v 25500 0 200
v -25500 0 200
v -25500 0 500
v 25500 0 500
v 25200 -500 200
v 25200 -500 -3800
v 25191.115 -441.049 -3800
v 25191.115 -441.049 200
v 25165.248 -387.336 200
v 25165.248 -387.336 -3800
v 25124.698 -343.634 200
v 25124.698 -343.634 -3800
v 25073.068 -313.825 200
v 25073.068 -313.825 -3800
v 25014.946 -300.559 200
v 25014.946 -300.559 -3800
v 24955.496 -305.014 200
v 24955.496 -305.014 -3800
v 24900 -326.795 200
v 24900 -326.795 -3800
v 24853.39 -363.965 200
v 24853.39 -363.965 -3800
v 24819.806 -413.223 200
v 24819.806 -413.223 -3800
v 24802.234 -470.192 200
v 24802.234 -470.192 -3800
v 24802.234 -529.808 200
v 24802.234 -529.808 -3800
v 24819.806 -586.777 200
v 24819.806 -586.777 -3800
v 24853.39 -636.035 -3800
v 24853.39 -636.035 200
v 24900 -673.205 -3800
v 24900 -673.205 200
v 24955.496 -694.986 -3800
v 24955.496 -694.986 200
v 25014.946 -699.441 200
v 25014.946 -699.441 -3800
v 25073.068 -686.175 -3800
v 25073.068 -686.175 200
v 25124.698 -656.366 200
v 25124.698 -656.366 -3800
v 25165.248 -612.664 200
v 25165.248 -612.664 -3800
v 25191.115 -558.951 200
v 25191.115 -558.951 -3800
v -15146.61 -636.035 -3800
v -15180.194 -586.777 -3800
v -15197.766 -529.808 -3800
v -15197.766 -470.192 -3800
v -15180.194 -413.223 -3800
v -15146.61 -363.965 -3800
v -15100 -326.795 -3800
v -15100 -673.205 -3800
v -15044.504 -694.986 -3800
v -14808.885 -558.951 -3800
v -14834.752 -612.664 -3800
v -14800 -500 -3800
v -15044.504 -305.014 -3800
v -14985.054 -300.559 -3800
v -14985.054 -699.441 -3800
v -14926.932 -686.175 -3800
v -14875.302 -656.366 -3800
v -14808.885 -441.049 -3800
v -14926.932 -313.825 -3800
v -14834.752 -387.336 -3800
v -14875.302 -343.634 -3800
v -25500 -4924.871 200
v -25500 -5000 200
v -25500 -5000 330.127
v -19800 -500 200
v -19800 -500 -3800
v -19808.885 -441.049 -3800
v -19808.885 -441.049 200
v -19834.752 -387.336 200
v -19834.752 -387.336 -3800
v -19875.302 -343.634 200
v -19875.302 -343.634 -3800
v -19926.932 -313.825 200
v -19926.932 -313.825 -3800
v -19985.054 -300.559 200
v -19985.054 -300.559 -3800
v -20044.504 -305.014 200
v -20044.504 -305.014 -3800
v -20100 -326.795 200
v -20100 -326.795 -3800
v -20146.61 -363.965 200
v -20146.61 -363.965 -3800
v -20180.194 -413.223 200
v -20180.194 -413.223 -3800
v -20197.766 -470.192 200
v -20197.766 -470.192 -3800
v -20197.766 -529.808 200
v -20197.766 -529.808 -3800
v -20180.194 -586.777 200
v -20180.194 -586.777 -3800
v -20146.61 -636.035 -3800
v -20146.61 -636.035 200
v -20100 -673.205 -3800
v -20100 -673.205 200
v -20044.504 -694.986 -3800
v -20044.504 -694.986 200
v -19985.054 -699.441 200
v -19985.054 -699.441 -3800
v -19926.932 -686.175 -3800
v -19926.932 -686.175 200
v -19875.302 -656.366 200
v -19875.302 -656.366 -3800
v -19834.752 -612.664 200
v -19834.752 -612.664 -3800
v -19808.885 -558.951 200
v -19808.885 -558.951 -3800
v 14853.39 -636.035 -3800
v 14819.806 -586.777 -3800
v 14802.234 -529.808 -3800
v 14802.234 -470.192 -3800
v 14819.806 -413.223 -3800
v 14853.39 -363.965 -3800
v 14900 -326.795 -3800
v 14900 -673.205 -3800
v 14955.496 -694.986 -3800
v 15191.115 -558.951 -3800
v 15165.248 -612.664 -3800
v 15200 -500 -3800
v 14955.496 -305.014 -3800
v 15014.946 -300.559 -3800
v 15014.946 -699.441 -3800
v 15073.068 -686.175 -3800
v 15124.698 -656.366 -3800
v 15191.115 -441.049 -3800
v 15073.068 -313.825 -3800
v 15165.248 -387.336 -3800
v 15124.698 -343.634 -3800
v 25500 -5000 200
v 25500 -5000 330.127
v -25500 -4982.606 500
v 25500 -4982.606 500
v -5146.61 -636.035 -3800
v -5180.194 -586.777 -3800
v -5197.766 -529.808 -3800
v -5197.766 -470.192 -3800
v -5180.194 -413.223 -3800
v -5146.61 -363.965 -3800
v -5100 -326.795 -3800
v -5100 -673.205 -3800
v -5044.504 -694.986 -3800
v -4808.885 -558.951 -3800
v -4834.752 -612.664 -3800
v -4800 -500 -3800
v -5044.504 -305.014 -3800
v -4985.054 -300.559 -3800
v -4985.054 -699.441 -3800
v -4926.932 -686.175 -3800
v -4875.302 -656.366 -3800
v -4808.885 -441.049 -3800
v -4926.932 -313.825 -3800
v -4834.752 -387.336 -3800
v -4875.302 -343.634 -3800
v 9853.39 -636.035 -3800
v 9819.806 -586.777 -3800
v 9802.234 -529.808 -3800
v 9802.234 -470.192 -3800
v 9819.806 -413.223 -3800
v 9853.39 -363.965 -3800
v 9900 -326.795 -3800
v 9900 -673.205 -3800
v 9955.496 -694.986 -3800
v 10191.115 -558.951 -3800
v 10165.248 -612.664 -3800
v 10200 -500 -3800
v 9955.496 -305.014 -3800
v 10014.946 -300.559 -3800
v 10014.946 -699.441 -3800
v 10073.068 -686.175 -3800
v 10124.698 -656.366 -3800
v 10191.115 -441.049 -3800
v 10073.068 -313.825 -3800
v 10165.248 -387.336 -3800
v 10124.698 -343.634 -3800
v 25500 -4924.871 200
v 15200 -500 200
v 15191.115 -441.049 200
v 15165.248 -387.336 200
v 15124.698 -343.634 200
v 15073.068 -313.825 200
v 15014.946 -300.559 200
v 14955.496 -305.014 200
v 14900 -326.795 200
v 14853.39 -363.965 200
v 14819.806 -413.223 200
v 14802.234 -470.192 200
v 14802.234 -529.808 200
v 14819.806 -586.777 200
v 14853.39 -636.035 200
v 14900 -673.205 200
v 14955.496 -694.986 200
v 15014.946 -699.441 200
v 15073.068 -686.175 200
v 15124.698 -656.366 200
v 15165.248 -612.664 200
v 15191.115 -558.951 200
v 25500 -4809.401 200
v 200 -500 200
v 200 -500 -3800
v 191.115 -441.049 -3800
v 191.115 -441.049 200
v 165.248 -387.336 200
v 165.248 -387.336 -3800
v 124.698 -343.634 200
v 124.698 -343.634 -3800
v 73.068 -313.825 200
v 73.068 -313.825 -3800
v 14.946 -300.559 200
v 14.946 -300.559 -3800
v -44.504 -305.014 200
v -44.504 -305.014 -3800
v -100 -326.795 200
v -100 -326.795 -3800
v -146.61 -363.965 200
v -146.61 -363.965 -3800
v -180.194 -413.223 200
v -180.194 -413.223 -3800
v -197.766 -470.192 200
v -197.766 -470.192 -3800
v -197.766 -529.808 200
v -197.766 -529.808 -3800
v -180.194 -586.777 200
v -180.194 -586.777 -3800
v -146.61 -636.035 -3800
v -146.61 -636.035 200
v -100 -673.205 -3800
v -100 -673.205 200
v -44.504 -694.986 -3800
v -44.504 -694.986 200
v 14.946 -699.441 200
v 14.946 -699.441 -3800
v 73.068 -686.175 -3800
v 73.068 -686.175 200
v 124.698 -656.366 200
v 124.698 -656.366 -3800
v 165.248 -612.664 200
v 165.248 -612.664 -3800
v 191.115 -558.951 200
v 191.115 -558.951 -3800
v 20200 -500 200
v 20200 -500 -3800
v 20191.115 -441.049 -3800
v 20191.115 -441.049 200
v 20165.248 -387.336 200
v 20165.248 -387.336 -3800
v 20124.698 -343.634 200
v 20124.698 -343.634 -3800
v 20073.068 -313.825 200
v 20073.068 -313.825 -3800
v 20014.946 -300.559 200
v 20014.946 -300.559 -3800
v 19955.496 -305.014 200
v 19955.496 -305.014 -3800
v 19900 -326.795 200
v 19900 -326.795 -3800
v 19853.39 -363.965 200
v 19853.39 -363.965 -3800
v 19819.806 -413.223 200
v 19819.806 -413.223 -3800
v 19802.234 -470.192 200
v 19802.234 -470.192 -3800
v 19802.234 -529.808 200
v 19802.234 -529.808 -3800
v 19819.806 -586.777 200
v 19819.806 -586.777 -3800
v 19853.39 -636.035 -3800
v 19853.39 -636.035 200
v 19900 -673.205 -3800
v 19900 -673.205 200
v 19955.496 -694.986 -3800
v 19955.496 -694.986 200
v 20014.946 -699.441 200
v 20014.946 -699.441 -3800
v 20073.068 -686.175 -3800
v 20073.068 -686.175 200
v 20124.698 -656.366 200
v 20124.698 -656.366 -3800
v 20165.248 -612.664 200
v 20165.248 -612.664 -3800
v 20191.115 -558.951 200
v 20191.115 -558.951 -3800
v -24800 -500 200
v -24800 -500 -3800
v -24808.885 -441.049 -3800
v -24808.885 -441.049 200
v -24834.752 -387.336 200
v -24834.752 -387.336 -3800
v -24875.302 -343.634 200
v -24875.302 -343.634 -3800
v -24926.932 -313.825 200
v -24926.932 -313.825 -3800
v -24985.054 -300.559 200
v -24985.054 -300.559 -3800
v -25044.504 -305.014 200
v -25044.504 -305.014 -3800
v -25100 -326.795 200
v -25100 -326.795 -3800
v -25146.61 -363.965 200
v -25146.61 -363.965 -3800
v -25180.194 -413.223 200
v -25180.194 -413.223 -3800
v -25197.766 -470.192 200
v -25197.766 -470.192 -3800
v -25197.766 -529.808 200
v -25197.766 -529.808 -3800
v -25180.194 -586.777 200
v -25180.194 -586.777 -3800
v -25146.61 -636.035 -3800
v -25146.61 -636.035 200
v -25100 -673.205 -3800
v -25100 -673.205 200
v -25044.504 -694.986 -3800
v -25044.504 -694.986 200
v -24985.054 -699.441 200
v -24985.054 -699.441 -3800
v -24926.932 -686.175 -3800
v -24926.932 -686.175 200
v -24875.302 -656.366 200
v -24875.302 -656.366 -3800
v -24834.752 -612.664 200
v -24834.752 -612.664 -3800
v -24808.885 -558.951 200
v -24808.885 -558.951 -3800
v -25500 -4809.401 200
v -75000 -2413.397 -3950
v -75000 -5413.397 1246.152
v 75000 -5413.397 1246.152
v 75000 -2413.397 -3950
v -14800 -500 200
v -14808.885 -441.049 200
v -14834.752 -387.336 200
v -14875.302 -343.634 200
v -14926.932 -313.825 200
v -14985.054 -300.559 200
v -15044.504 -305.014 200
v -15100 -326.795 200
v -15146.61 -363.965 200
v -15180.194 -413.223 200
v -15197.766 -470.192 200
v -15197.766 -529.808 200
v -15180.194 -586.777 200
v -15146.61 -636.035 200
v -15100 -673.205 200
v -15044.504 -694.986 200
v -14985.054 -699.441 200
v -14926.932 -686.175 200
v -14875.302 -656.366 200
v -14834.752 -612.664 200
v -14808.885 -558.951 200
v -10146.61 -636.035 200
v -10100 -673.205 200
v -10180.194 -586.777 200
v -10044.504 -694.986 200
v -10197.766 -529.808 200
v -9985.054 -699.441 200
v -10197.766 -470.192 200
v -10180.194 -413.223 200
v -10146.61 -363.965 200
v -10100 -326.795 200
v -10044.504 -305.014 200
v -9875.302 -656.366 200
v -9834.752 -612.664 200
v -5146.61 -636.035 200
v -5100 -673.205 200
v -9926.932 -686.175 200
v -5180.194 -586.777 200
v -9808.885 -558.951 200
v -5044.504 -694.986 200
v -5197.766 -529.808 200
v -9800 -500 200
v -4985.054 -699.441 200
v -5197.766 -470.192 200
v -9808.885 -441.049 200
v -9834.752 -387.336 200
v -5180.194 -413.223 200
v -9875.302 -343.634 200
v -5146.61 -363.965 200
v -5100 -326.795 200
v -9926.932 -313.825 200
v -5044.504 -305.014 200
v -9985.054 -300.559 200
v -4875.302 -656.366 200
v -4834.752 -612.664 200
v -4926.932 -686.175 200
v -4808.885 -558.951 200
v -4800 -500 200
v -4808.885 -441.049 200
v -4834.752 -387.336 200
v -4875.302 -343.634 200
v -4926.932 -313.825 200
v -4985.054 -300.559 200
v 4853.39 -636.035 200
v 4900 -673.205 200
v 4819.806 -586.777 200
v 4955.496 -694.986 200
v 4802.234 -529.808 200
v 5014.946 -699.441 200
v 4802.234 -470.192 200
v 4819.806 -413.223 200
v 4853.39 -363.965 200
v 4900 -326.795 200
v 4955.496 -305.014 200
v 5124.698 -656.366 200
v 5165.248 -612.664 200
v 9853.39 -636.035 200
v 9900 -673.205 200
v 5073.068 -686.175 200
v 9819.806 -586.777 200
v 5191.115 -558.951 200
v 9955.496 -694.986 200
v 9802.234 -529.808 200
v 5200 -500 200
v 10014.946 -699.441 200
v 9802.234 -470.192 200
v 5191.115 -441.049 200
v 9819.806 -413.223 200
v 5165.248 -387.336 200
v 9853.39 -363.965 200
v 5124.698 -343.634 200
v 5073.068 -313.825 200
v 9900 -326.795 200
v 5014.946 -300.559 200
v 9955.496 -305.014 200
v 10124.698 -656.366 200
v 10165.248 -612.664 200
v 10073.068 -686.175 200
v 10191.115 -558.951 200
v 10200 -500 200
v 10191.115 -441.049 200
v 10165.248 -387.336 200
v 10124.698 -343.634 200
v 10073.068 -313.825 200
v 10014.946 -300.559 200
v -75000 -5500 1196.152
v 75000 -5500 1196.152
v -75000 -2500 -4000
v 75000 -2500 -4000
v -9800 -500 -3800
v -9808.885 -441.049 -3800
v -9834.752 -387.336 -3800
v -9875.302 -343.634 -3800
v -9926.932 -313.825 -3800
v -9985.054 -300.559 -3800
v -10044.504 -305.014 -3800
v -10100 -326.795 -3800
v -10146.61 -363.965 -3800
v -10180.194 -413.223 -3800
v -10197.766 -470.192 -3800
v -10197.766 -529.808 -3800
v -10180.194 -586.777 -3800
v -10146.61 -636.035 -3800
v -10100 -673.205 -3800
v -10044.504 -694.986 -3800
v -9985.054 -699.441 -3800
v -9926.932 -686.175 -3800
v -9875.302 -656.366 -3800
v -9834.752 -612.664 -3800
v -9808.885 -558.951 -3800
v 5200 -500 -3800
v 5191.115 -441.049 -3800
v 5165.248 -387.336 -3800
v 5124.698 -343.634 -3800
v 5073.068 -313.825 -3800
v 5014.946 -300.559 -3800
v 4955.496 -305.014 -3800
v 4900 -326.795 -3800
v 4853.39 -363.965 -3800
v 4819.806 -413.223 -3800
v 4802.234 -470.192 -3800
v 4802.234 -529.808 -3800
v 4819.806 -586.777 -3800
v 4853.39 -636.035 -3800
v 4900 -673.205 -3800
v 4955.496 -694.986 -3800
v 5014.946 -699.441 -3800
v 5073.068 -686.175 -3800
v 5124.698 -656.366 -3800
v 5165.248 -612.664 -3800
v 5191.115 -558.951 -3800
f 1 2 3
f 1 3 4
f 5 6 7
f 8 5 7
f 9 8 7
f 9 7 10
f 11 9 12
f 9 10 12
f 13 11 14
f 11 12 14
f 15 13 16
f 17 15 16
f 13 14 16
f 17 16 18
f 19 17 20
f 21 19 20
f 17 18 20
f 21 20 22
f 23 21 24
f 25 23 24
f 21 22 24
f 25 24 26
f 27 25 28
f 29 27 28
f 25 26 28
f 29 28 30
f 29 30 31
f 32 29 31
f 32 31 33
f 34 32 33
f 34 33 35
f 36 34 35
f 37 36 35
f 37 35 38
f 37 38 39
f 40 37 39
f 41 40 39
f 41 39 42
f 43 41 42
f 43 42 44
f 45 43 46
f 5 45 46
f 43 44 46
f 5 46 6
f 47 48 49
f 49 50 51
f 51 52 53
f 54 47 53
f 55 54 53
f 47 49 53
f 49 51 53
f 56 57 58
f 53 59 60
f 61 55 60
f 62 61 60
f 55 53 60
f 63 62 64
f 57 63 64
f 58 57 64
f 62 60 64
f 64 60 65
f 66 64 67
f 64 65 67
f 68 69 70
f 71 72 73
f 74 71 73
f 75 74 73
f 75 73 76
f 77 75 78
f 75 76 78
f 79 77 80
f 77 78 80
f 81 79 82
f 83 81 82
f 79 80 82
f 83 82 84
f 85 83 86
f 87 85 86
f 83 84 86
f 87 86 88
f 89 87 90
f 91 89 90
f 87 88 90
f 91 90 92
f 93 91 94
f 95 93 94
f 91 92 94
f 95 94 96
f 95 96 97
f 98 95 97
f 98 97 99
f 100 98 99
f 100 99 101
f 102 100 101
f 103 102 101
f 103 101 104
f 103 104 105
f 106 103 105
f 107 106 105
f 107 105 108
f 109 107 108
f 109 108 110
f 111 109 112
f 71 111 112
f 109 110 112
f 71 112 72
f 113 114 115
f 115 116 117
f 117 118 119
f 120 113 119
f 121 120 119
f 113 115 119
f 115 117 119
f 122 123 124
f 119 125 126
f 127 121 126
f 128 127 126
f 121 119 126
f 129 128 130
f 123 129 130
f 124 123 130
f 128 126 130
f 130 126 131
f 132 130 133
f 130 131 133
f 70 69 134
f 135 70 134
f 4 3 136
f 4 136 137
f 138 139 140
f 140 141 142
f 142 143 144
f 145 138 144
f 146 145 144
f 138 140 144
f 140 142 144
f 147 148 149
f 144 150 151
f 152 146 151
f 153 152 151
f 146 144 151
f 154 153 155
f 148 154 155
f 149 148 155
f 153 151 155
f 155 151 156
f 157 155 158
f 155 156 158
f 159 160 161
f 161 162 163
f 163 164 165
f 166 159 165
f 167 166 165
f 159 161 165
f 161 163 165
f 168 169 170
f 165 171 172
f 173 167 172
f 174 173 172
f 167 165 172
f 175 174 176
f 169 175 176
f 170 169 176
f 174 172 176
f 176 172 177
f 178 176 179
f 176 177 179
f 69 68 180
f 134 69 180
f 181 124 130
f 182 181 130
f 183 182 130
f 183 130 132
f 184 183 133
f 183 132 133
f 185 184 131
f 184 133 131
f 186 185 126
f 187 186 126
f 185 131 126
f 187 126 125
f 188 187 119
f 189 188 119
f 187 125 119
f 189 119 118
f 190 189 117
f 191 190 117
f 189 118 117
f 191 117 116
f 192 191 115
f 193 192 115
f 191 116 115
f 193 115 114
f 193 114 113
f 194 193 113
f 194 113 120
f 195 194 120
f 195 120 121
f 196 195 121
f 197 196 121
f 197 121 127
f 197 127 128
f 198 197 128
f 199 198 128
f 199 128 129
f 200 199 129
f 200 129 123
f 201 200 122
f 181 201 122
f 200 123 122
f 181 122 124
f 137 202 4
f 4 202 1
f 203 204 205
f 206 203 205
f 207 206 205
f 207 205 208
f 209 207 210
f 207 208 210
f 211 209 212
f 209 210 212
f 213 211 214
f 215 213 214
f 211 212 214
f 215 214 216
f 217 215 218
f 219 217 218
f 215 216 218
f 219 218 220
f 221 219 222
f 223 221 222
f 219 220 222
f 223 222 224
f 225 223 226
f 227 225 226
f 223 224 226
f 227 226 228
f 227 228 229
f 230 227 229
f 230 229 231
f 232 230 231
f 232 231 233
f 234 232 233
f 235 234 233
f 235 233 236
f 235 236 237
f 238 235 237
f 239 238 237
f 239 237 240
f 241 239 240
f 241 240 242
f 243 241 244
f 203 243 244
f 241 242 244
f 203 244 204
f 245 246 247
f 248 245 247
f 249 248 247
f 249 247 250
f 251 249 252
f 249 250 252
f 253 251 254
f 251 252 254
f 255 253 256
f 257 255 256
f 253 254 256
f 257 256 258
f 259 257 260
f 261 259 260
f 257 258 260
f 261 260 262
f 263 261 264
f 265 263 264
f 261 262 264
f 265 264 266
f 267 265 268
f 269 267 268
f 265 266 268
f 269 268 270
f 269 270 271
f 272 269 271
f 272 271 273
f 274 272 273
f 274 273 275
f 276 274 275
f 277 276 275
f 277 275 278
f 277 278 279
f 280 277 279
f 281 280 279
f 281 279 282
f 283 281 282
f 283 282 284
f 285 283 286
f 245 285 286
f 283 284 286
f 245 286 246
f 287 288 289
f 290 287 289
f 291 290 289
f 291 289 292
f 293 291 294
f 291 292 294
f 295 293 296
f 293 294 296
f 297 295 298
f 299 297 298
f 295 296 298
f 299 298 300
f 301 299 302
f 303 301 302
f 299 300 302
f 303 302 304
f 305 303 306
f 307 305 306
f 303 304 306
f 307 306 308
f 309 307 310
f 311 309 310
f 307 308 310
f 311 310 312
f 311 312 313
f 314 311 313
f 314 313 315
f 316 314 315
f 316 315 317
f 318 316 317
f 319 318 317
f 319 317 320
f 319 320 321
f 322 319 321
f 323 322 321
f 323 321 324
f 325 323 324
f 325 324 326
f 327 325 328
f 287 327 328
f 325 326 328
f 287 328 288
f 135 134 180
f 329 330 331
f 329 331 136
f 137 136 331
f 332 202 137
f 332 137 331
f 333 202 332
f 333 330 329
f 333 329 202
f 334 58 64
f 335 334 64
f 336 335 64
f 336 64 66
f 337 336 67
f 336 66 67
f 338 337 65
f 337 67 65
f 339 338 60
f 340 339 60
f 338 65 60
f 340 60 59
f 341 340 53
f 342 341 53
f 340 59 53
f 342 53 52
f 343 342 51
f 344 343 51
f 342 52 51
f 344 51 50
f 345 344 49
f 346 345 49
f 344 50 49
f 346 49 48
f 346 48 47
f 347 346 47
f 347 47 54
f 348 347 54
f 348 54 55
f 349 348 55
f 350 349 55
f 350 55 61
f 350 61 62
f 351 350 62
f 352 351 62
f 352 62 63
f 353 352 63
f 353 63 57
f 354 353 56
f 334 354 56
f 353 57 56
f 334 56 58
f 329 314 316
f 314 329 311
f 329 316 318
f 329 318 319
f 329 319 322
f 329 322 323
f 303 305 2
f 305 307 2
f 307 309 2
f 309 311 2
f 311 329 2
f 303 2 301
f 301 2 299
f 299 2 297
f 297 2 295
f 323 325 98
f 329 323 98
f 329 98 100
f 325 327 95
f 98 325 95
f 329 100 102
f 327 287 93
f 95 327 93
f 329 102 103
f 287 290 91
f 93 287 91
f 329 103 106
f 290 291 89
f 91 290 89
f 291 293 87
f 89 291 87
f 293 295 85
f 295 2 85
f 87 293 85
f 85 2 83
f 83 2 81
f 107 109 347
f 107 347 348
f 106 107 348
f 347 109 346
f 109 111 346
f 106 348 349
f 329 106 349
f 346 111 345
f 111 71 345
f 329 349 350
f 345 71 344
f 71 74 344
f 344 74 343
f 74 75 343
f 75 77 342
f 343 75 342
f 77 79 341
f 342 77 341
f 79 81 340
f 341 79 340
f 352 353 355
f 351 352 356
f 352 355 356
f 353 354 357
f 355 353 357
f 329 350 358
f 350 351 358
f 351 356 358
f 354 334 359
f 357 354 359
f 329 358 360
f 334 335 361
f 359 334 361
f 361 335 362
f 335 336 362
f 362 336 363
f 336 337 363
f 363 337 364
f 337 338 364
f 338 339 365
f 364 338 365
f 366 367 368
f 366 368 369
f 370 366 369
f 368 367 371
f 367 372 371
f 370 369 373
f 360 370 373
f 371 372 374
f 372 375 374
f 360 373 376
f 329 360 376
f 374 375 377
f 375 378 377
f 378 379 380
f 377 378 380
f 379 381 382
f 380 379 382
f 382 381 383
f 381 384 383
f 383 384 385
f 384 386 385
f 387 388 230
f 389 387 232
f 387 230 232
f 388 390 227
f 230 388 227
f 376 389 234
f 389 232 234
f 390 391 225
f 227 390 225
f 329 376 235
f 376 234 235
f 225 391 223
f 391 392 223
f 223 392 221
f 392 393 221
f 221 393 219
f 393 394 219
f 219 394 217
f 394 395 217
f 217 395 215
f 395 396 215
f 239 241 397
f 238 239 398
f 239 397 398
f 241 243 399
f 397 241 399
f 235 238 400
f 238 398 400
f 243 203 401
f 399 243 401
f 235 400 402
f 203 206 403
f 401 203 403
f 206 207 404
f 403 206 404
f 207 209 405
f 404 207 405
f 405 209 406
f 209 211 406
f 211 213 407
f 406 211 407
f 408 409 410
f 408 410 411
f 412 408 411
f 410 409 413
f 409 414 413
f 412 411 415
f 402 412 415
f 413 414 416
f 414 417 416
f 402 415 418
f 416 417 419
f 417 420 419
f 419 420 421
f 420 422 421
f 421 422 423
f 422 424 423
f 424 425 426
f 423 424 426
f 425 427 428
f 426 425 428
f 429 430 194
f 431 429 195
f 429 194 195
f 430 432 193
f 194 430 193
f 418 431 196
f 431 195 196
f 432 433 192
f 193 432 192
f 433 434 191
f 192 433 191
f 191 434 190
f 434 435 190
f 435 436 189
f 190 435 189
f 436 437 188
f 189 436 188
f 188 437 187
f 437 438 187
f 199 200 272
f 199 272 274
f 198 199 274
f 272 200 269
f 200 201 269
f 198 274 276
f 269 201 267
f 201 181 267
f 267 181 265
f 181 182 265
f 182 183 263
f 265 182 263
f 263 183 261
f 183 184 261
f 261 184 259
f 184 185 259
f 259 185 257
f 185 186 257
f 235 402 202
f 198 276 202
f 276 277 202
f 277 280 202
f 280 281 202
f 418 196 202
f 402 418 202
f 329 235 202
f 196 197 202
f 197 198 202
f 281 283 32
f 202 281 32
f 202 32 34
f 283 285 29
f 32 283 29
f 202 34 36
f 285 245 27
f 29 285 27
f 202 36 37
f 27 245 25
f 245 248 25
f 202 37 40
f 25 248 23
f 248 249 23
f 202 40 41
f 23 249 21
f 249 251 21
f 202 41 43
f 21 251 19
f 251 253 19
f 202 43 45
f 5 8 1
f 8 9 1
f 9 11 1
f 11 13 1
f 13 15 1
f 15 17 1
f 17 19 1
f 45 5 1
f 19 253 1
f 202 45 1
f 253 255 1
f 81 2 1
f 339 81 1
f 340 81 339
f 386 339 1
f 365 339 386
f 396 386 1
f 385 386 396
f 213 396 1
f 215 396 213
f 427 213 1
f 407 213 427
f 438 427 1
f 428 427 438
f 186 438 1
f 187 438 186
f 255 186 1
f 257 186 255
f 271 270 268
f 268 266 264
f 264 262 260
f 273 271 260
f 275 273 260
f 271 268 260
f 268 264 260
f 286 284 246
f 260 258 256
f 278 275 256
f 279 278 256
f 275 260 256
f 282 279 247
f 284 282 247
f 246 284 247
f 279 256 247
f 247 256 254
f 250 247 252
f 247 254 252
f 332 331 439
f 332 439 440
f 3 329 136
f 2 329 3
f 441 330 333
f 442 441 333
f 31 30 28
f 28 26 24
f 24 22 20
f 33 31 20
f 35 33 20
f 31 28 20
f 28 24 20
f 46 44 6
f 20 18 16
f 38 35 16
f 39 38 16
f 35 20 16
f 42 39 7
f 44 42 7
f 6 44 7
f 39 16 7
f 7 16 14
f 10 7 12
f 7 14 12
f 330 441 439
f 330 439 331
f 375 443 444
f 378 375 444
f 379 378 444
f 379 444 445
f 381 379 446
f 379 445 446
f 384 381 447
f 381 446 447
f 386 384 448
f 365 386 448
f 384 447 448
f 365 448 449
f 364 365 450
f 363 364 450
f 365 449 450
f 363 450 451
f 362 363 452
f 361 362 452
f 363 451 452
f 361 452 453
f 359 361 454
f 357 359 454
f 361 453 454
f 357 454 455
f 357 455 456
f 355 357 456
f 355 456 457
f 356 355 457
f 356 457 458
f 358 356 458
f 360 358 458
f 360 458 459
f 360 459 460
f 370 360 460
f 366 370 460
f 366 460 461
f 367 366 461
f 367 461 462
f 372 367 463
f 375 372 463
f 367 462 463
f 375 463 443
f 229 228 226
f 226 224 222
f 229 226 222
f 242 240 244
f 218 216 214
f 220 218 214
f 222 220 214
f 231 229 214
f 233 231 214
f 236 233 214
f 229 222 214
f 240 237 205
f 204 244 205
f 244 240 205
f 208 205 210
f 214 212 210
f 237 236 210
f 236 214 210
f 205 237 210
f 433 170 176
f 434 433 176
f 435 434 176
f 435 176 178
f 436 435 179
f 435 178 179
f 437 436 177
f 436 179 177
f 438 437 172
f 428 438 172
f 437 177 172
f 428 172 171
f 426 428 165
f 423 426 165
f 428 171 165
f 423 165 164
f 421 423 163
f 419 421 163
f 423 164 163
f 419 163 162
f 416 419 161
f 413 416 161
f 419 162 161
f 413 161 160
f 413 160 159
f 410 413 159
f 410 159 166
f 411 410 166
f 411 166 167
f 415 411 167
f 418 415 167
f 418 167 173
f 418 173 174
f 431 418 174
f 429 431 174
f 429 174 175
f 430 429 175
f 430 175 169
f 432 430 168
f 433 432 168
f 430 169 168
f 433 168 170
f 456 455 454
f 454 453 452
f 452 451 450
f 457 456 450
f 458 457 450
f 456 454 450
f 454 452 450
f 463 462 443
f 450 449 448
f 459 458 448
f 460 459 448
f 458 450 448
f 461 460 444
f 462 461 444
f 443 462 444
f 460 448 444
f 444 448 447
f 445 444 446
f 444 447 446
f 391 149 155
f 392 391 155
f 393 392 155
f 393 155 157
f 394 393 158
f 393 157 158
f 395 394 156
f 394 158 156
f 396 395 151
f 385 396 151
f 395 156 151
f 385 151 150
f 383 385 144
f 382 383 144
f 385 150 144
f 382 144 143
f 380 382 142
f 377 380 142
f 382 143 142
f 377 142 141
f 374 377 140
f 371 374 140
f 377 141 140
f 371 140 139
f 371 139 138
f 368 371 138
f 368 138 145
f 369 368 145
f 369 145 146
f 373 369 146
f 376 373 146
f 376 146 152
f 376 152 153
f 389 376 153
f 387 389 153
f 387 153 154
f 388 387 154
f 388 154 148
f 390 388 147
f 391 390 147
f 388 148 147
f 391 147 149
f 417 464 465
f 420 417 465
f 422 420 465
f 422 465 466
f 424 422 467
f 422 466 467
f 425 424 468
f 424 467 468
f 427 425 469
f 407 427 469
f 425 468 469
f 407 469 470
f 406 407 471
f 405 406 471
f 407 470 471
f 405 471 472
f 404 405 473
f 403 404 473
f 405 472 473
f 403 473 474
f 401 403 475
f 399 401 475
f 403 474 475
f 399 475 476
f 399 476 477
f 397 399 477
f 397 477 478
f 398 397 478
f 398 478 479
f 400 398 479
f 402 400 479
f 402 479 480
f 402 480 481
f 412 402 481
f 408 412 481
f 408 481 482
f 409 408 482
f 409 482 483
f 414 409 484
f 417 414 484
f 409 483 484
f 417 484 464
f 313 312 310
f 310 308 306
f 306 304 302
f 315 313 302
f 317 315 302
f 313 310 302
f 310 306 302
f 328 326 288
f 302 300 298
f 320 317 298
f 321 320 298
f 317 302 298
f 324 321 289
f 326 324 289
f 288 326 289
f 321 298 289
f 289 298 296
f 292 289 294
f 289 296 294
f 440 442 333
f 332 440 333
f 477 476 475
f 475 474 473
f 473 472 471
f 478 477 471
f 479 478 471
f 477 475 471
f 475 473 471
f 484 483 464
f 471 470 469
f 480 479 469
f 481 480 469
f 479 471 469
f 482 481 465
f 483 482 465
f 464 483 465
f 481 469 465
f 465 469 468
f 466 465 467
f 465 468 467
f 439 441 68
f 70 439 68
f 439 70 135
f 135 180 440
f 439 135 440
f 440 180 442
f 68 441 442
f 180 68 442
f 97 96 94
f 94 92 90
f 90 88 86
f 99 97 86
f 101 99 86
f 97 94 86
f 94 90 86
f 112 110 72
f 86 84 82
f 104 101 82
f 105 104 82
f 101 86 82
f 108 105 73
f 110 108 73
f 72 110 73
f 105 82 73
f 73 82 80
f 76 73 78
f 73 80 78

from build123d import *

# Parameters (mm, degrees)
CYLINDER010_R          = 200
CYLINDER010_DEPTH      = 4000
CYLINDER_R             = 200
CYLINDER_DEPTH         = 4000
CYLINDER008_R          = 200
CYLINDER008_DEPTH      = 4000
CYLINDER007_R          = 200
CYLINDER007_DEPTH      = 4000
CYLINDER005_R          = 200
CYLINDER005_DEPTH      = 4000
CYLINDER003_R          = 200
CYLINDER003_DEPTH      = 4000
CYLINDER004_R          = 200
CYLINDER004_DEPTH      = 4000
CYLINDER002_R          = 200
CYLINDER002_DEPTH      = 4000
CYLINDER009_R          = 200
CYLINDER009_DEPTH      = 4000
BOX001_W               = 150000
BOX001_H               = 100
BOX001_DEPTH           = 6000
BOX001_PLACEMENT_ANGLE = 30
CYLINDER001_R          = 200
CYLINDER001_DEPTH      = 4000
CYLINDER006_R          = 200
CYLINDER006_DEPTH      = 4000
BOX_W                  = 51000
BOX_H                  = 5000
BOX_DEPTH              = 300


with BuildPart() as cylinder010:
    # Cylinder010 → Cylinder010 (new body)
    with BuildSketch(Plane(origin=(-25000, -500, -3800), x_dir=(1, 0, 0), z_dir=(0, 0, 1))):
        Circle(CYLINDER010_R)
    extrude(amount=CYLINDER010_DEPTH)


with BuildPart() as cylinder:
    # Cylinder → Cylinder (new body)
    with BuildSketch(Plane(origin=(0, -500, -3800), x_dir=(1, 0, 0), z_dir=(0, 0, 1))):
        Circle(CYLINDER_R)
    extrude(amount=CYLINDER_DEPTH)


with BuildPart() as cylinder008:
    # Cylinder008 → Cylinder008 (new body)
    with BuildSketch(Plane(origin=(-15000, -500, -3800), x_dir=(1, 0, 0), z_dir=(0, 0, 1))):
        Circle(CYLINDER008_R)
    extrude(amount=CYLINDER008_DEPTH)


with BuildPart() as cylinder007:
    # Cylinder007 → Cylinder007 (new body)
    with BuildSketch(Plane(origin=(-10000, -500, -3800), x_dir=(1, 0, 0), z_dir=(0, 0, 1))):
        Circle(CYLINDER007_R)
    extrude(amount=CYLINDER007_DEPTH)


with BuildPart() as cylinder005:
    # Cylinder005 → Cylinder005 (new body)
    with BuildSketch(Plane(origin=(25000, -500, -3800), x_dir=(1, 0, 0), z_dir=(0, 0, 1))):
        Circle(CYLINDER005_R)
    extrude(amount=CYLINDER005_DEPTH)


with BuildPart() as cylinder003:
    # Cylinder003 → Cylinder003 (new body)
    with BuildSketch(Plane(origin=(15000, -500, -3800), x_dir=(1, 0, 0), z_dir=(0, 0, 1))):
        Circle(CYLINDER003_R)
    extrude(amount=CYLINDER003_DEPTH)


with BuildPart() as cylinder004:
    # Cylinder004 → Cylinder004 (new body)
    with BuildSketch(Plane(origin=(20000, -500, -3800), x_dir=(1, 0, 0), z_dir=(0, 0, 1))):
        Circle(CYLINDER004_R)
    extrude(amount=CYLINDER004_DEPTH)


with BuildPart() as cylinder002:
    # Cylinder002 → Cylinder002 (new body)
    with BuildSketch(Plane(origin=(10000, -500, -3800), x_dir=(1, 0, 0), z_dir=(0, 0, 1))):
        Circle(CYLINDER002_R)
    extrude(amount=CYLINDER002_DEPTH)


with BuildPart() as cylinder009:
    # Cylinder009 → Cylinder009 (new body)
    with BuildSketch(Plane(origin=(-20000, -500, -3800), x_dir=(1, 0, 0), z_dir=(0, 0, 1))):
        Circle(CYLINDER009_R)
    extrude(amount=CYLINDER009_DEPTH)


with BuildPart() as cube001:
    # Box001 → Box001 (new body)
    with BuildSketch(Plane.XY):
        with Locations((75000, 50)):
            Rectangle(BOX001_W, BOX001_H)
    extrude(amount=BOX001_DEPTH)


with BuildPart() as cube001_1:
    # Box001 placement: moved
    add(cube001.part.moved(Location((-75000, -2500, -4000))).rotate(Axis((-75000, -2500, -4000), (1, 0, 0)), BOX001_PLACEMENT_ANGLE))


with BuildPart() as cylinder001:
    # Cylinder001 → Cylinder001 (new body)
    with BuildSketch(Plane(origin=(5000, -500, -3800), x_dir=(1, 0, 0), z_dir=(0, 0, 1))):
        Circle(CYLINDER001_R)
    extrude(amount=CYLINDER001_DEPTH)


with BuildPart() as cylinder006:
    # Cylinder006 → Cylinder006 (new body)
    with BuildSketch(Plane(origin=(-5000, -500, -3800), x_dir=(1, 0, 0), z_dir=(0, 0, 1))):
        Circle(CYLINDER006_R)
    extrude(amount=CYLINDER006_DEPTH)


with BuildPart() as fusion:
    # Box → Box (new body)
    with BuildSketch(Plane(origin=(-25500, -5000, 200), x_dir=(1, 0, 0), z_dir=(0, 0, 1))):
        with Locations((25500, 2500)):
            Rectangle(BOX_W, BOX_H)
    extrude(amount=BOX_DEPTH)

    # Fusion: union Cylinder010, Cylinder, Cylinder008, Cylinder007, Cylinder005, Cylinder003, Cylinder004, Cylinder002, Cylinder009, Cube001, Cylinder001, Cylinder006
    add(cylinder010.part)
    add(cylinder.part)
    add(cylinder008.part)
    add(cylinder007.part)
    add(cylinder005.part)
    add(cylinder003.part)
    add(cylinder004.part)
    add(cylinder002.part)
    add(cylinder009.part)
    add(cube001_1.part)
    add(cylinder001.part)
    add(cylinder006.part)


solid = fusion.part
